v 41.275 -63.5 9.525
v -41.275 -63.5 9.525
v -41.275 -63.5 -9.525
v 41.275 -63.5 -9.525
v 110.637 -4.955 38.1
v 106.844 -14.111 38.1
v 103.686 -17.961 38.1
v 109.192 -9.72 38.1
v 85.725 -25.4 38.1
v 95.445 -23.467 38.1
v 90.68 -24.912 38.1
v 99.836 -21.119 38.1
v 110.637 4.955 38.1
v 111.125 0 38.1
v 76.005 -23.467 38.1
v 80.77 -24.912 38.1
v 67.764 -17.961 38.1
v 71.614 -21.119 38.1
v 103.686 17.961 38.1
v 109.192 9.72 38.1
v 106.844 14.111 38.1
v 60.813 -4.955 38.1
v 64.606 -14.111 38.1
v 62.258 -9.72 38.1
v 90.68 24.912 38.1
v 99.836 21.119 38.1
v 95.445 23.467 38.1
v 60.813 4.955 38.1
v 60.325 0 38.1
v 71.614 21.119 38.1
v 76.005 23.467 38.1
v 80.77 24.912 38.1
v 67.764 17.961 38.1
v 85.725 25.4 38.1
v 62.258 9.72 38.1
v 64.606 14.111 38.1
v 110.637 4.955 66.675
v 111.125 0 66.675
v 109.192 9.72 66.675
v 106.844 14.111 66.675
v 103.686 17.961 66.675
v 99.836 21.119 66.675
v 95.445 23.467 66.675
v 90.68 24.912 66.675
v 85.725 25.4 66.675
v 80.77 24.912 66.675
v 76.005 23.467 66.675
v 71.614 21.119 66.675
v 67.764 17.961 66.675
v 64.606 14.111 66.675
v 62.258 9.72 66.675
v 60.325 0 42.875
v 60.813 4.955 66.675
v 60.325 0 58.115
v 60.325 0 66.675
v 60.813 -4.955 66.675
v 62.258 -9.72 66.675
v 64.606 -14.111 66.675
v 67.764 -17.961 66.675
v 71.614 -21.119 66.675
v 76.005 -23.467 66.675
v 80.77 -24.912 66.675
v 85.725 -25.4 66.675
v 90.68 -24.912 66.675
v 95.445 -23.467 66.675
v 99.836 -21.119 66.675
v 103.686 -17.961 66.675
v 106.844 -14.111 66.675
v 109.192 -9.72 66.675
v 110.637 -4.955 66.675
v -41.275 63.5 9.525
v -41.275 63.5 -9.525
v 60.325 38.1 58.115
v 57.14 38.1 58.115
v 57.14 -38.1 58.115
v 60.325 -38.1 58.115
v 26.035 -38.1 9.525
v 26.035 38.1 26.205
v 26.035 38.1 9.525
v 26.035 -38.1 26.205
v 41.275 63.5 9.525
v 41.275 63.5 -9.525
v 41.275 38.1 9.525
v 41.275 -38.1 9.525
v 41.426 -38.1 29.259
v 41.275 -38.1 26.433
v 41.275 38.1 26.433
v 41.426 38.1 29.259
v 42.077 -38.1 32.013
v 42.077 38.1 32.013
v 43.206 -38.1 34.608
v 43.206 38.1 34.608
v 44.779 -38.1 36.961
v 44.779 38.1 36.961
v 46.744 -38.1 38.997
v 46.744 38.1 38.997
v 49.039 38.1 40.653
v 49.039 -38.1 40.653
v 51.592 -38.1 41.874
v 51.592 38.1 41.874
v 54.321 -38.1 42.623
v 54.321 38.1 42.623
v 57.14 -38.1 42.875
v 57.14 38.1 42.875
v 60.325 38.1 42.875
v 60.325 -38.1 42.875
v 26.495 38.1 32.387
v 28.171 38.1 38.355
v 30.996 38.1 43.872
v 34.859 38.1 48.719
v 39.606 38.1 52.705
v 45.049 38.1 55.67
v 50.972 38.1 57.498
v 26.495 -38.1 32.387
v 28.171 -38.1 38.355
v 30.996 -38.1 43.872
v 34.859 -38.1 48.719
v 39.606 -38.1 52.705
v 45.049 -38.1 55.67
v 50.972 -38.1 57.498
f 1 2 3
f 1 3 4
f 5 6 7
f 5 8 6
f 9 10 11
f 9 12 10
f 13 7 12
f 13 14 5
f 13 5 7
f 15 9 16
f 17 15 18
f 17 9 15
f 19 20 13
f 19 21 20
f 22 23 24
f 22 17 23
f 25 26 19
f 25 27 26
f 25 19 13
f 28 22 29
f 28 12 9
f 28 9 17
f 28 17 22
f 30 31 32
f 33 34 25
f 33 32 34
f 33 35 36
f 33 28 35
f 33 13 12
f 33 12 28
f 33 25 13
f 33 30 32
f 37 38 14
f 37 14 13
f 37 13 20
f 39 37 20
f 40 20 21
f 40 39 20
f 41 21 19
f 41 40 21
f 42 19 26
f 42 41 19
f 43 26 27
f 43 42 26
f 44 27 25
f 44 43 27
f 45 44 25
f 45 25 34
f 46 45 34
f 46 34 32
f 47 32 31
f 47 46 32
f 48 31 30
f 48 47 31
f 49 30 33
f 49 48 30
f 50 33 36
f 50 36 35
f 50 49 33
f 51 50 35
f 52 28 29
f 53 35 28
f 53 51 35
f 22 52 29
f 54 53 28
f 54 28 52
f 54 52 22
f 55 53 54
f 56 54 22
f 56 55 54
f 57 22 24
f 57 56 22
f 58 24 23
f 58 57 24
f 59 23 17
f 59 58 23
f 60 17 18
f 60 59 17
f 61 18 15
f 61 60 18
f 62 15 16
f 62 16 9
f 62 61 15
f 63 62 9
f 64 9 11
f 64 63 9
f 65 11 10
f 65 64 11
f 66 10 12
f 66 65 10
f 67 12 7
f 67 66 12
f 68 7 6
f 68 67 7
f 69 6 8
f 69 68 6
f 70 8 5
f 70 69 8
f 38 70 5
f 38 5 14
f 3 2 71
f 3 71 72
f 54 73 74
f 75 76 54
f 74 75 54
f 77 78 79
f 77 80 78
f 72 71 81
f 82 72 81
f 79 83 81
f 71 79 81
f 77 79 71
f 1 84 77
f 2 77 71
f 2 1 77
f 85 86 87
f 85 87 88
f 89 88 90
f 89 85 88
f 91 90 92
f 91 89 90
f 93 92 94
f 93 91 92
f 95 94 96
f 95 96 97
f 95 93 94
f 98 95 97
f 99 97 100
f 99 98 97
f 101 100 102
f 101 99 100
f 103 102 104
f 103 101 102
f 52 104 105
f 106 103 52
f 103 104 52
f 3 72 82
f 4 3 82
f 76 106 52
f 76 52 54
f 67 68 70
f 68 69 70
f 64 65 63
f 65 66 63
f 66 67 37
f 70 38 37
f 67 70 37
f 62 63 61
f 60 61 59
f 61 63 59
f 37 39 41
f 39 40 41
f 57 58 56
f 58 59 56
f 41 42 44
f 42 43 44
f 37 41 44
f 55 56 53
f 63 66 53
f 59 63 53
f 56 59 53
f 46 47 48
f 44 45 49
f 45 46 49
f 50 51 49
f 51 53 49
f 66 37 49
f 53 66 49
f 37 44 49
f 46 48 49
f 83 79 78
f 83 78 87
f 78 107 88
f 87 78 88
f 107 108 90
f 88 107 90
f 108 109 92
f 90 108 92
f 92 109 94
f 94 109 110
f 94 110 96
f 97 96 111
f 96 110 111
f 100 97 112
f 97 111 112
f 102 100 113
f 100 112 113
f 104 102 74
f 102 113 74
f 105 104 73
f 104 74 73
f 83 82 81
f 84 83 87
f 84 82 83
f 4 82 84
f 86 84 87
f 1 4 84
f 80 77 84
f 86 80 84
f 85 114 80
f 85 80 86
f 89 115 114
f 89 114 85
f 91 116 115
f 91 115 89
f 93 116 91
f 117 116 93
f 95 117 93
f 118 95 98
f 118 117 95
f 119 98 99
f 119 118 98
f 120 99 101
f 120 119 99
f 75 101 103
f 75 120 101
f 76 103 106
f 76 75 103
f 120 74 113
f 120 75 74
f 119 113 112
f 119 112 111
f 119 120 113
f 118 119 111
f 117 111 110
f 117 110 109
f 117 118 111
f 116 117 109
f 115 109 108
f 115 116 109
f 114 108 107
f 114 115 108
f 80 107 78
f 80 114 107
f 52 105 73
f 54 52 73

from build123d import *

# Parameters (mm, degrees)
F1_DEPTH = 63.5
F2_DEPTH = 38.1
F0_W     = 25.4
F0_H     = 28.575


with BuildPart() as f1:
    # F0 (on Front) → F1 (new body, symmetric)
    with BuildSketch(Plane.XZ):
        Polygon((41.275, -9.525), (41.275, 9.525), (26.035, 9.525), (-41.275, 9.525), (-41.275, -9.525), align=None)
    extrude(amount=F1_DEPTH, both=True)

    # F0 (on Front) → F2 (join, symmetric)
    with BuildSketch(Plane.XZ):
        with BuildLine():
            Line((26.035, 9.525), (41.275, 9.525))
            Line((41.275, 9.525), (41.275, 26.432585))
            ThreePointArc((41.275, 26.432585), (45.715609, 38.023011), (57.139849, 42.8752))
            Line((57.139849, 42.8752), (60.325, 42.8752))
            Line((60.325, 42.8752), (60.325, 58.1152))
            Line((60.325, 58.1152), (57.139849, 58.1152))
            ThreePointArc((57.139849, 58.1152), (34.859016, 48.719033), (26.035, 26.205477))
            Line((26.035, 26.205477), (26.035, 9.525))
        make_face()
    extrude(amount=F2_DEPTH, both=True)

    # F0 (on Front) → F3 (revolve)
    with BuildSketch(Plane.XZ):
        with Locations((98.425, 52.3875)):
            Rectangle(F0_W, F0_H)
    revolve(axis=Axis((85.725, 0, 52.3875), (0, 0, 1)))


solid = f1.part
